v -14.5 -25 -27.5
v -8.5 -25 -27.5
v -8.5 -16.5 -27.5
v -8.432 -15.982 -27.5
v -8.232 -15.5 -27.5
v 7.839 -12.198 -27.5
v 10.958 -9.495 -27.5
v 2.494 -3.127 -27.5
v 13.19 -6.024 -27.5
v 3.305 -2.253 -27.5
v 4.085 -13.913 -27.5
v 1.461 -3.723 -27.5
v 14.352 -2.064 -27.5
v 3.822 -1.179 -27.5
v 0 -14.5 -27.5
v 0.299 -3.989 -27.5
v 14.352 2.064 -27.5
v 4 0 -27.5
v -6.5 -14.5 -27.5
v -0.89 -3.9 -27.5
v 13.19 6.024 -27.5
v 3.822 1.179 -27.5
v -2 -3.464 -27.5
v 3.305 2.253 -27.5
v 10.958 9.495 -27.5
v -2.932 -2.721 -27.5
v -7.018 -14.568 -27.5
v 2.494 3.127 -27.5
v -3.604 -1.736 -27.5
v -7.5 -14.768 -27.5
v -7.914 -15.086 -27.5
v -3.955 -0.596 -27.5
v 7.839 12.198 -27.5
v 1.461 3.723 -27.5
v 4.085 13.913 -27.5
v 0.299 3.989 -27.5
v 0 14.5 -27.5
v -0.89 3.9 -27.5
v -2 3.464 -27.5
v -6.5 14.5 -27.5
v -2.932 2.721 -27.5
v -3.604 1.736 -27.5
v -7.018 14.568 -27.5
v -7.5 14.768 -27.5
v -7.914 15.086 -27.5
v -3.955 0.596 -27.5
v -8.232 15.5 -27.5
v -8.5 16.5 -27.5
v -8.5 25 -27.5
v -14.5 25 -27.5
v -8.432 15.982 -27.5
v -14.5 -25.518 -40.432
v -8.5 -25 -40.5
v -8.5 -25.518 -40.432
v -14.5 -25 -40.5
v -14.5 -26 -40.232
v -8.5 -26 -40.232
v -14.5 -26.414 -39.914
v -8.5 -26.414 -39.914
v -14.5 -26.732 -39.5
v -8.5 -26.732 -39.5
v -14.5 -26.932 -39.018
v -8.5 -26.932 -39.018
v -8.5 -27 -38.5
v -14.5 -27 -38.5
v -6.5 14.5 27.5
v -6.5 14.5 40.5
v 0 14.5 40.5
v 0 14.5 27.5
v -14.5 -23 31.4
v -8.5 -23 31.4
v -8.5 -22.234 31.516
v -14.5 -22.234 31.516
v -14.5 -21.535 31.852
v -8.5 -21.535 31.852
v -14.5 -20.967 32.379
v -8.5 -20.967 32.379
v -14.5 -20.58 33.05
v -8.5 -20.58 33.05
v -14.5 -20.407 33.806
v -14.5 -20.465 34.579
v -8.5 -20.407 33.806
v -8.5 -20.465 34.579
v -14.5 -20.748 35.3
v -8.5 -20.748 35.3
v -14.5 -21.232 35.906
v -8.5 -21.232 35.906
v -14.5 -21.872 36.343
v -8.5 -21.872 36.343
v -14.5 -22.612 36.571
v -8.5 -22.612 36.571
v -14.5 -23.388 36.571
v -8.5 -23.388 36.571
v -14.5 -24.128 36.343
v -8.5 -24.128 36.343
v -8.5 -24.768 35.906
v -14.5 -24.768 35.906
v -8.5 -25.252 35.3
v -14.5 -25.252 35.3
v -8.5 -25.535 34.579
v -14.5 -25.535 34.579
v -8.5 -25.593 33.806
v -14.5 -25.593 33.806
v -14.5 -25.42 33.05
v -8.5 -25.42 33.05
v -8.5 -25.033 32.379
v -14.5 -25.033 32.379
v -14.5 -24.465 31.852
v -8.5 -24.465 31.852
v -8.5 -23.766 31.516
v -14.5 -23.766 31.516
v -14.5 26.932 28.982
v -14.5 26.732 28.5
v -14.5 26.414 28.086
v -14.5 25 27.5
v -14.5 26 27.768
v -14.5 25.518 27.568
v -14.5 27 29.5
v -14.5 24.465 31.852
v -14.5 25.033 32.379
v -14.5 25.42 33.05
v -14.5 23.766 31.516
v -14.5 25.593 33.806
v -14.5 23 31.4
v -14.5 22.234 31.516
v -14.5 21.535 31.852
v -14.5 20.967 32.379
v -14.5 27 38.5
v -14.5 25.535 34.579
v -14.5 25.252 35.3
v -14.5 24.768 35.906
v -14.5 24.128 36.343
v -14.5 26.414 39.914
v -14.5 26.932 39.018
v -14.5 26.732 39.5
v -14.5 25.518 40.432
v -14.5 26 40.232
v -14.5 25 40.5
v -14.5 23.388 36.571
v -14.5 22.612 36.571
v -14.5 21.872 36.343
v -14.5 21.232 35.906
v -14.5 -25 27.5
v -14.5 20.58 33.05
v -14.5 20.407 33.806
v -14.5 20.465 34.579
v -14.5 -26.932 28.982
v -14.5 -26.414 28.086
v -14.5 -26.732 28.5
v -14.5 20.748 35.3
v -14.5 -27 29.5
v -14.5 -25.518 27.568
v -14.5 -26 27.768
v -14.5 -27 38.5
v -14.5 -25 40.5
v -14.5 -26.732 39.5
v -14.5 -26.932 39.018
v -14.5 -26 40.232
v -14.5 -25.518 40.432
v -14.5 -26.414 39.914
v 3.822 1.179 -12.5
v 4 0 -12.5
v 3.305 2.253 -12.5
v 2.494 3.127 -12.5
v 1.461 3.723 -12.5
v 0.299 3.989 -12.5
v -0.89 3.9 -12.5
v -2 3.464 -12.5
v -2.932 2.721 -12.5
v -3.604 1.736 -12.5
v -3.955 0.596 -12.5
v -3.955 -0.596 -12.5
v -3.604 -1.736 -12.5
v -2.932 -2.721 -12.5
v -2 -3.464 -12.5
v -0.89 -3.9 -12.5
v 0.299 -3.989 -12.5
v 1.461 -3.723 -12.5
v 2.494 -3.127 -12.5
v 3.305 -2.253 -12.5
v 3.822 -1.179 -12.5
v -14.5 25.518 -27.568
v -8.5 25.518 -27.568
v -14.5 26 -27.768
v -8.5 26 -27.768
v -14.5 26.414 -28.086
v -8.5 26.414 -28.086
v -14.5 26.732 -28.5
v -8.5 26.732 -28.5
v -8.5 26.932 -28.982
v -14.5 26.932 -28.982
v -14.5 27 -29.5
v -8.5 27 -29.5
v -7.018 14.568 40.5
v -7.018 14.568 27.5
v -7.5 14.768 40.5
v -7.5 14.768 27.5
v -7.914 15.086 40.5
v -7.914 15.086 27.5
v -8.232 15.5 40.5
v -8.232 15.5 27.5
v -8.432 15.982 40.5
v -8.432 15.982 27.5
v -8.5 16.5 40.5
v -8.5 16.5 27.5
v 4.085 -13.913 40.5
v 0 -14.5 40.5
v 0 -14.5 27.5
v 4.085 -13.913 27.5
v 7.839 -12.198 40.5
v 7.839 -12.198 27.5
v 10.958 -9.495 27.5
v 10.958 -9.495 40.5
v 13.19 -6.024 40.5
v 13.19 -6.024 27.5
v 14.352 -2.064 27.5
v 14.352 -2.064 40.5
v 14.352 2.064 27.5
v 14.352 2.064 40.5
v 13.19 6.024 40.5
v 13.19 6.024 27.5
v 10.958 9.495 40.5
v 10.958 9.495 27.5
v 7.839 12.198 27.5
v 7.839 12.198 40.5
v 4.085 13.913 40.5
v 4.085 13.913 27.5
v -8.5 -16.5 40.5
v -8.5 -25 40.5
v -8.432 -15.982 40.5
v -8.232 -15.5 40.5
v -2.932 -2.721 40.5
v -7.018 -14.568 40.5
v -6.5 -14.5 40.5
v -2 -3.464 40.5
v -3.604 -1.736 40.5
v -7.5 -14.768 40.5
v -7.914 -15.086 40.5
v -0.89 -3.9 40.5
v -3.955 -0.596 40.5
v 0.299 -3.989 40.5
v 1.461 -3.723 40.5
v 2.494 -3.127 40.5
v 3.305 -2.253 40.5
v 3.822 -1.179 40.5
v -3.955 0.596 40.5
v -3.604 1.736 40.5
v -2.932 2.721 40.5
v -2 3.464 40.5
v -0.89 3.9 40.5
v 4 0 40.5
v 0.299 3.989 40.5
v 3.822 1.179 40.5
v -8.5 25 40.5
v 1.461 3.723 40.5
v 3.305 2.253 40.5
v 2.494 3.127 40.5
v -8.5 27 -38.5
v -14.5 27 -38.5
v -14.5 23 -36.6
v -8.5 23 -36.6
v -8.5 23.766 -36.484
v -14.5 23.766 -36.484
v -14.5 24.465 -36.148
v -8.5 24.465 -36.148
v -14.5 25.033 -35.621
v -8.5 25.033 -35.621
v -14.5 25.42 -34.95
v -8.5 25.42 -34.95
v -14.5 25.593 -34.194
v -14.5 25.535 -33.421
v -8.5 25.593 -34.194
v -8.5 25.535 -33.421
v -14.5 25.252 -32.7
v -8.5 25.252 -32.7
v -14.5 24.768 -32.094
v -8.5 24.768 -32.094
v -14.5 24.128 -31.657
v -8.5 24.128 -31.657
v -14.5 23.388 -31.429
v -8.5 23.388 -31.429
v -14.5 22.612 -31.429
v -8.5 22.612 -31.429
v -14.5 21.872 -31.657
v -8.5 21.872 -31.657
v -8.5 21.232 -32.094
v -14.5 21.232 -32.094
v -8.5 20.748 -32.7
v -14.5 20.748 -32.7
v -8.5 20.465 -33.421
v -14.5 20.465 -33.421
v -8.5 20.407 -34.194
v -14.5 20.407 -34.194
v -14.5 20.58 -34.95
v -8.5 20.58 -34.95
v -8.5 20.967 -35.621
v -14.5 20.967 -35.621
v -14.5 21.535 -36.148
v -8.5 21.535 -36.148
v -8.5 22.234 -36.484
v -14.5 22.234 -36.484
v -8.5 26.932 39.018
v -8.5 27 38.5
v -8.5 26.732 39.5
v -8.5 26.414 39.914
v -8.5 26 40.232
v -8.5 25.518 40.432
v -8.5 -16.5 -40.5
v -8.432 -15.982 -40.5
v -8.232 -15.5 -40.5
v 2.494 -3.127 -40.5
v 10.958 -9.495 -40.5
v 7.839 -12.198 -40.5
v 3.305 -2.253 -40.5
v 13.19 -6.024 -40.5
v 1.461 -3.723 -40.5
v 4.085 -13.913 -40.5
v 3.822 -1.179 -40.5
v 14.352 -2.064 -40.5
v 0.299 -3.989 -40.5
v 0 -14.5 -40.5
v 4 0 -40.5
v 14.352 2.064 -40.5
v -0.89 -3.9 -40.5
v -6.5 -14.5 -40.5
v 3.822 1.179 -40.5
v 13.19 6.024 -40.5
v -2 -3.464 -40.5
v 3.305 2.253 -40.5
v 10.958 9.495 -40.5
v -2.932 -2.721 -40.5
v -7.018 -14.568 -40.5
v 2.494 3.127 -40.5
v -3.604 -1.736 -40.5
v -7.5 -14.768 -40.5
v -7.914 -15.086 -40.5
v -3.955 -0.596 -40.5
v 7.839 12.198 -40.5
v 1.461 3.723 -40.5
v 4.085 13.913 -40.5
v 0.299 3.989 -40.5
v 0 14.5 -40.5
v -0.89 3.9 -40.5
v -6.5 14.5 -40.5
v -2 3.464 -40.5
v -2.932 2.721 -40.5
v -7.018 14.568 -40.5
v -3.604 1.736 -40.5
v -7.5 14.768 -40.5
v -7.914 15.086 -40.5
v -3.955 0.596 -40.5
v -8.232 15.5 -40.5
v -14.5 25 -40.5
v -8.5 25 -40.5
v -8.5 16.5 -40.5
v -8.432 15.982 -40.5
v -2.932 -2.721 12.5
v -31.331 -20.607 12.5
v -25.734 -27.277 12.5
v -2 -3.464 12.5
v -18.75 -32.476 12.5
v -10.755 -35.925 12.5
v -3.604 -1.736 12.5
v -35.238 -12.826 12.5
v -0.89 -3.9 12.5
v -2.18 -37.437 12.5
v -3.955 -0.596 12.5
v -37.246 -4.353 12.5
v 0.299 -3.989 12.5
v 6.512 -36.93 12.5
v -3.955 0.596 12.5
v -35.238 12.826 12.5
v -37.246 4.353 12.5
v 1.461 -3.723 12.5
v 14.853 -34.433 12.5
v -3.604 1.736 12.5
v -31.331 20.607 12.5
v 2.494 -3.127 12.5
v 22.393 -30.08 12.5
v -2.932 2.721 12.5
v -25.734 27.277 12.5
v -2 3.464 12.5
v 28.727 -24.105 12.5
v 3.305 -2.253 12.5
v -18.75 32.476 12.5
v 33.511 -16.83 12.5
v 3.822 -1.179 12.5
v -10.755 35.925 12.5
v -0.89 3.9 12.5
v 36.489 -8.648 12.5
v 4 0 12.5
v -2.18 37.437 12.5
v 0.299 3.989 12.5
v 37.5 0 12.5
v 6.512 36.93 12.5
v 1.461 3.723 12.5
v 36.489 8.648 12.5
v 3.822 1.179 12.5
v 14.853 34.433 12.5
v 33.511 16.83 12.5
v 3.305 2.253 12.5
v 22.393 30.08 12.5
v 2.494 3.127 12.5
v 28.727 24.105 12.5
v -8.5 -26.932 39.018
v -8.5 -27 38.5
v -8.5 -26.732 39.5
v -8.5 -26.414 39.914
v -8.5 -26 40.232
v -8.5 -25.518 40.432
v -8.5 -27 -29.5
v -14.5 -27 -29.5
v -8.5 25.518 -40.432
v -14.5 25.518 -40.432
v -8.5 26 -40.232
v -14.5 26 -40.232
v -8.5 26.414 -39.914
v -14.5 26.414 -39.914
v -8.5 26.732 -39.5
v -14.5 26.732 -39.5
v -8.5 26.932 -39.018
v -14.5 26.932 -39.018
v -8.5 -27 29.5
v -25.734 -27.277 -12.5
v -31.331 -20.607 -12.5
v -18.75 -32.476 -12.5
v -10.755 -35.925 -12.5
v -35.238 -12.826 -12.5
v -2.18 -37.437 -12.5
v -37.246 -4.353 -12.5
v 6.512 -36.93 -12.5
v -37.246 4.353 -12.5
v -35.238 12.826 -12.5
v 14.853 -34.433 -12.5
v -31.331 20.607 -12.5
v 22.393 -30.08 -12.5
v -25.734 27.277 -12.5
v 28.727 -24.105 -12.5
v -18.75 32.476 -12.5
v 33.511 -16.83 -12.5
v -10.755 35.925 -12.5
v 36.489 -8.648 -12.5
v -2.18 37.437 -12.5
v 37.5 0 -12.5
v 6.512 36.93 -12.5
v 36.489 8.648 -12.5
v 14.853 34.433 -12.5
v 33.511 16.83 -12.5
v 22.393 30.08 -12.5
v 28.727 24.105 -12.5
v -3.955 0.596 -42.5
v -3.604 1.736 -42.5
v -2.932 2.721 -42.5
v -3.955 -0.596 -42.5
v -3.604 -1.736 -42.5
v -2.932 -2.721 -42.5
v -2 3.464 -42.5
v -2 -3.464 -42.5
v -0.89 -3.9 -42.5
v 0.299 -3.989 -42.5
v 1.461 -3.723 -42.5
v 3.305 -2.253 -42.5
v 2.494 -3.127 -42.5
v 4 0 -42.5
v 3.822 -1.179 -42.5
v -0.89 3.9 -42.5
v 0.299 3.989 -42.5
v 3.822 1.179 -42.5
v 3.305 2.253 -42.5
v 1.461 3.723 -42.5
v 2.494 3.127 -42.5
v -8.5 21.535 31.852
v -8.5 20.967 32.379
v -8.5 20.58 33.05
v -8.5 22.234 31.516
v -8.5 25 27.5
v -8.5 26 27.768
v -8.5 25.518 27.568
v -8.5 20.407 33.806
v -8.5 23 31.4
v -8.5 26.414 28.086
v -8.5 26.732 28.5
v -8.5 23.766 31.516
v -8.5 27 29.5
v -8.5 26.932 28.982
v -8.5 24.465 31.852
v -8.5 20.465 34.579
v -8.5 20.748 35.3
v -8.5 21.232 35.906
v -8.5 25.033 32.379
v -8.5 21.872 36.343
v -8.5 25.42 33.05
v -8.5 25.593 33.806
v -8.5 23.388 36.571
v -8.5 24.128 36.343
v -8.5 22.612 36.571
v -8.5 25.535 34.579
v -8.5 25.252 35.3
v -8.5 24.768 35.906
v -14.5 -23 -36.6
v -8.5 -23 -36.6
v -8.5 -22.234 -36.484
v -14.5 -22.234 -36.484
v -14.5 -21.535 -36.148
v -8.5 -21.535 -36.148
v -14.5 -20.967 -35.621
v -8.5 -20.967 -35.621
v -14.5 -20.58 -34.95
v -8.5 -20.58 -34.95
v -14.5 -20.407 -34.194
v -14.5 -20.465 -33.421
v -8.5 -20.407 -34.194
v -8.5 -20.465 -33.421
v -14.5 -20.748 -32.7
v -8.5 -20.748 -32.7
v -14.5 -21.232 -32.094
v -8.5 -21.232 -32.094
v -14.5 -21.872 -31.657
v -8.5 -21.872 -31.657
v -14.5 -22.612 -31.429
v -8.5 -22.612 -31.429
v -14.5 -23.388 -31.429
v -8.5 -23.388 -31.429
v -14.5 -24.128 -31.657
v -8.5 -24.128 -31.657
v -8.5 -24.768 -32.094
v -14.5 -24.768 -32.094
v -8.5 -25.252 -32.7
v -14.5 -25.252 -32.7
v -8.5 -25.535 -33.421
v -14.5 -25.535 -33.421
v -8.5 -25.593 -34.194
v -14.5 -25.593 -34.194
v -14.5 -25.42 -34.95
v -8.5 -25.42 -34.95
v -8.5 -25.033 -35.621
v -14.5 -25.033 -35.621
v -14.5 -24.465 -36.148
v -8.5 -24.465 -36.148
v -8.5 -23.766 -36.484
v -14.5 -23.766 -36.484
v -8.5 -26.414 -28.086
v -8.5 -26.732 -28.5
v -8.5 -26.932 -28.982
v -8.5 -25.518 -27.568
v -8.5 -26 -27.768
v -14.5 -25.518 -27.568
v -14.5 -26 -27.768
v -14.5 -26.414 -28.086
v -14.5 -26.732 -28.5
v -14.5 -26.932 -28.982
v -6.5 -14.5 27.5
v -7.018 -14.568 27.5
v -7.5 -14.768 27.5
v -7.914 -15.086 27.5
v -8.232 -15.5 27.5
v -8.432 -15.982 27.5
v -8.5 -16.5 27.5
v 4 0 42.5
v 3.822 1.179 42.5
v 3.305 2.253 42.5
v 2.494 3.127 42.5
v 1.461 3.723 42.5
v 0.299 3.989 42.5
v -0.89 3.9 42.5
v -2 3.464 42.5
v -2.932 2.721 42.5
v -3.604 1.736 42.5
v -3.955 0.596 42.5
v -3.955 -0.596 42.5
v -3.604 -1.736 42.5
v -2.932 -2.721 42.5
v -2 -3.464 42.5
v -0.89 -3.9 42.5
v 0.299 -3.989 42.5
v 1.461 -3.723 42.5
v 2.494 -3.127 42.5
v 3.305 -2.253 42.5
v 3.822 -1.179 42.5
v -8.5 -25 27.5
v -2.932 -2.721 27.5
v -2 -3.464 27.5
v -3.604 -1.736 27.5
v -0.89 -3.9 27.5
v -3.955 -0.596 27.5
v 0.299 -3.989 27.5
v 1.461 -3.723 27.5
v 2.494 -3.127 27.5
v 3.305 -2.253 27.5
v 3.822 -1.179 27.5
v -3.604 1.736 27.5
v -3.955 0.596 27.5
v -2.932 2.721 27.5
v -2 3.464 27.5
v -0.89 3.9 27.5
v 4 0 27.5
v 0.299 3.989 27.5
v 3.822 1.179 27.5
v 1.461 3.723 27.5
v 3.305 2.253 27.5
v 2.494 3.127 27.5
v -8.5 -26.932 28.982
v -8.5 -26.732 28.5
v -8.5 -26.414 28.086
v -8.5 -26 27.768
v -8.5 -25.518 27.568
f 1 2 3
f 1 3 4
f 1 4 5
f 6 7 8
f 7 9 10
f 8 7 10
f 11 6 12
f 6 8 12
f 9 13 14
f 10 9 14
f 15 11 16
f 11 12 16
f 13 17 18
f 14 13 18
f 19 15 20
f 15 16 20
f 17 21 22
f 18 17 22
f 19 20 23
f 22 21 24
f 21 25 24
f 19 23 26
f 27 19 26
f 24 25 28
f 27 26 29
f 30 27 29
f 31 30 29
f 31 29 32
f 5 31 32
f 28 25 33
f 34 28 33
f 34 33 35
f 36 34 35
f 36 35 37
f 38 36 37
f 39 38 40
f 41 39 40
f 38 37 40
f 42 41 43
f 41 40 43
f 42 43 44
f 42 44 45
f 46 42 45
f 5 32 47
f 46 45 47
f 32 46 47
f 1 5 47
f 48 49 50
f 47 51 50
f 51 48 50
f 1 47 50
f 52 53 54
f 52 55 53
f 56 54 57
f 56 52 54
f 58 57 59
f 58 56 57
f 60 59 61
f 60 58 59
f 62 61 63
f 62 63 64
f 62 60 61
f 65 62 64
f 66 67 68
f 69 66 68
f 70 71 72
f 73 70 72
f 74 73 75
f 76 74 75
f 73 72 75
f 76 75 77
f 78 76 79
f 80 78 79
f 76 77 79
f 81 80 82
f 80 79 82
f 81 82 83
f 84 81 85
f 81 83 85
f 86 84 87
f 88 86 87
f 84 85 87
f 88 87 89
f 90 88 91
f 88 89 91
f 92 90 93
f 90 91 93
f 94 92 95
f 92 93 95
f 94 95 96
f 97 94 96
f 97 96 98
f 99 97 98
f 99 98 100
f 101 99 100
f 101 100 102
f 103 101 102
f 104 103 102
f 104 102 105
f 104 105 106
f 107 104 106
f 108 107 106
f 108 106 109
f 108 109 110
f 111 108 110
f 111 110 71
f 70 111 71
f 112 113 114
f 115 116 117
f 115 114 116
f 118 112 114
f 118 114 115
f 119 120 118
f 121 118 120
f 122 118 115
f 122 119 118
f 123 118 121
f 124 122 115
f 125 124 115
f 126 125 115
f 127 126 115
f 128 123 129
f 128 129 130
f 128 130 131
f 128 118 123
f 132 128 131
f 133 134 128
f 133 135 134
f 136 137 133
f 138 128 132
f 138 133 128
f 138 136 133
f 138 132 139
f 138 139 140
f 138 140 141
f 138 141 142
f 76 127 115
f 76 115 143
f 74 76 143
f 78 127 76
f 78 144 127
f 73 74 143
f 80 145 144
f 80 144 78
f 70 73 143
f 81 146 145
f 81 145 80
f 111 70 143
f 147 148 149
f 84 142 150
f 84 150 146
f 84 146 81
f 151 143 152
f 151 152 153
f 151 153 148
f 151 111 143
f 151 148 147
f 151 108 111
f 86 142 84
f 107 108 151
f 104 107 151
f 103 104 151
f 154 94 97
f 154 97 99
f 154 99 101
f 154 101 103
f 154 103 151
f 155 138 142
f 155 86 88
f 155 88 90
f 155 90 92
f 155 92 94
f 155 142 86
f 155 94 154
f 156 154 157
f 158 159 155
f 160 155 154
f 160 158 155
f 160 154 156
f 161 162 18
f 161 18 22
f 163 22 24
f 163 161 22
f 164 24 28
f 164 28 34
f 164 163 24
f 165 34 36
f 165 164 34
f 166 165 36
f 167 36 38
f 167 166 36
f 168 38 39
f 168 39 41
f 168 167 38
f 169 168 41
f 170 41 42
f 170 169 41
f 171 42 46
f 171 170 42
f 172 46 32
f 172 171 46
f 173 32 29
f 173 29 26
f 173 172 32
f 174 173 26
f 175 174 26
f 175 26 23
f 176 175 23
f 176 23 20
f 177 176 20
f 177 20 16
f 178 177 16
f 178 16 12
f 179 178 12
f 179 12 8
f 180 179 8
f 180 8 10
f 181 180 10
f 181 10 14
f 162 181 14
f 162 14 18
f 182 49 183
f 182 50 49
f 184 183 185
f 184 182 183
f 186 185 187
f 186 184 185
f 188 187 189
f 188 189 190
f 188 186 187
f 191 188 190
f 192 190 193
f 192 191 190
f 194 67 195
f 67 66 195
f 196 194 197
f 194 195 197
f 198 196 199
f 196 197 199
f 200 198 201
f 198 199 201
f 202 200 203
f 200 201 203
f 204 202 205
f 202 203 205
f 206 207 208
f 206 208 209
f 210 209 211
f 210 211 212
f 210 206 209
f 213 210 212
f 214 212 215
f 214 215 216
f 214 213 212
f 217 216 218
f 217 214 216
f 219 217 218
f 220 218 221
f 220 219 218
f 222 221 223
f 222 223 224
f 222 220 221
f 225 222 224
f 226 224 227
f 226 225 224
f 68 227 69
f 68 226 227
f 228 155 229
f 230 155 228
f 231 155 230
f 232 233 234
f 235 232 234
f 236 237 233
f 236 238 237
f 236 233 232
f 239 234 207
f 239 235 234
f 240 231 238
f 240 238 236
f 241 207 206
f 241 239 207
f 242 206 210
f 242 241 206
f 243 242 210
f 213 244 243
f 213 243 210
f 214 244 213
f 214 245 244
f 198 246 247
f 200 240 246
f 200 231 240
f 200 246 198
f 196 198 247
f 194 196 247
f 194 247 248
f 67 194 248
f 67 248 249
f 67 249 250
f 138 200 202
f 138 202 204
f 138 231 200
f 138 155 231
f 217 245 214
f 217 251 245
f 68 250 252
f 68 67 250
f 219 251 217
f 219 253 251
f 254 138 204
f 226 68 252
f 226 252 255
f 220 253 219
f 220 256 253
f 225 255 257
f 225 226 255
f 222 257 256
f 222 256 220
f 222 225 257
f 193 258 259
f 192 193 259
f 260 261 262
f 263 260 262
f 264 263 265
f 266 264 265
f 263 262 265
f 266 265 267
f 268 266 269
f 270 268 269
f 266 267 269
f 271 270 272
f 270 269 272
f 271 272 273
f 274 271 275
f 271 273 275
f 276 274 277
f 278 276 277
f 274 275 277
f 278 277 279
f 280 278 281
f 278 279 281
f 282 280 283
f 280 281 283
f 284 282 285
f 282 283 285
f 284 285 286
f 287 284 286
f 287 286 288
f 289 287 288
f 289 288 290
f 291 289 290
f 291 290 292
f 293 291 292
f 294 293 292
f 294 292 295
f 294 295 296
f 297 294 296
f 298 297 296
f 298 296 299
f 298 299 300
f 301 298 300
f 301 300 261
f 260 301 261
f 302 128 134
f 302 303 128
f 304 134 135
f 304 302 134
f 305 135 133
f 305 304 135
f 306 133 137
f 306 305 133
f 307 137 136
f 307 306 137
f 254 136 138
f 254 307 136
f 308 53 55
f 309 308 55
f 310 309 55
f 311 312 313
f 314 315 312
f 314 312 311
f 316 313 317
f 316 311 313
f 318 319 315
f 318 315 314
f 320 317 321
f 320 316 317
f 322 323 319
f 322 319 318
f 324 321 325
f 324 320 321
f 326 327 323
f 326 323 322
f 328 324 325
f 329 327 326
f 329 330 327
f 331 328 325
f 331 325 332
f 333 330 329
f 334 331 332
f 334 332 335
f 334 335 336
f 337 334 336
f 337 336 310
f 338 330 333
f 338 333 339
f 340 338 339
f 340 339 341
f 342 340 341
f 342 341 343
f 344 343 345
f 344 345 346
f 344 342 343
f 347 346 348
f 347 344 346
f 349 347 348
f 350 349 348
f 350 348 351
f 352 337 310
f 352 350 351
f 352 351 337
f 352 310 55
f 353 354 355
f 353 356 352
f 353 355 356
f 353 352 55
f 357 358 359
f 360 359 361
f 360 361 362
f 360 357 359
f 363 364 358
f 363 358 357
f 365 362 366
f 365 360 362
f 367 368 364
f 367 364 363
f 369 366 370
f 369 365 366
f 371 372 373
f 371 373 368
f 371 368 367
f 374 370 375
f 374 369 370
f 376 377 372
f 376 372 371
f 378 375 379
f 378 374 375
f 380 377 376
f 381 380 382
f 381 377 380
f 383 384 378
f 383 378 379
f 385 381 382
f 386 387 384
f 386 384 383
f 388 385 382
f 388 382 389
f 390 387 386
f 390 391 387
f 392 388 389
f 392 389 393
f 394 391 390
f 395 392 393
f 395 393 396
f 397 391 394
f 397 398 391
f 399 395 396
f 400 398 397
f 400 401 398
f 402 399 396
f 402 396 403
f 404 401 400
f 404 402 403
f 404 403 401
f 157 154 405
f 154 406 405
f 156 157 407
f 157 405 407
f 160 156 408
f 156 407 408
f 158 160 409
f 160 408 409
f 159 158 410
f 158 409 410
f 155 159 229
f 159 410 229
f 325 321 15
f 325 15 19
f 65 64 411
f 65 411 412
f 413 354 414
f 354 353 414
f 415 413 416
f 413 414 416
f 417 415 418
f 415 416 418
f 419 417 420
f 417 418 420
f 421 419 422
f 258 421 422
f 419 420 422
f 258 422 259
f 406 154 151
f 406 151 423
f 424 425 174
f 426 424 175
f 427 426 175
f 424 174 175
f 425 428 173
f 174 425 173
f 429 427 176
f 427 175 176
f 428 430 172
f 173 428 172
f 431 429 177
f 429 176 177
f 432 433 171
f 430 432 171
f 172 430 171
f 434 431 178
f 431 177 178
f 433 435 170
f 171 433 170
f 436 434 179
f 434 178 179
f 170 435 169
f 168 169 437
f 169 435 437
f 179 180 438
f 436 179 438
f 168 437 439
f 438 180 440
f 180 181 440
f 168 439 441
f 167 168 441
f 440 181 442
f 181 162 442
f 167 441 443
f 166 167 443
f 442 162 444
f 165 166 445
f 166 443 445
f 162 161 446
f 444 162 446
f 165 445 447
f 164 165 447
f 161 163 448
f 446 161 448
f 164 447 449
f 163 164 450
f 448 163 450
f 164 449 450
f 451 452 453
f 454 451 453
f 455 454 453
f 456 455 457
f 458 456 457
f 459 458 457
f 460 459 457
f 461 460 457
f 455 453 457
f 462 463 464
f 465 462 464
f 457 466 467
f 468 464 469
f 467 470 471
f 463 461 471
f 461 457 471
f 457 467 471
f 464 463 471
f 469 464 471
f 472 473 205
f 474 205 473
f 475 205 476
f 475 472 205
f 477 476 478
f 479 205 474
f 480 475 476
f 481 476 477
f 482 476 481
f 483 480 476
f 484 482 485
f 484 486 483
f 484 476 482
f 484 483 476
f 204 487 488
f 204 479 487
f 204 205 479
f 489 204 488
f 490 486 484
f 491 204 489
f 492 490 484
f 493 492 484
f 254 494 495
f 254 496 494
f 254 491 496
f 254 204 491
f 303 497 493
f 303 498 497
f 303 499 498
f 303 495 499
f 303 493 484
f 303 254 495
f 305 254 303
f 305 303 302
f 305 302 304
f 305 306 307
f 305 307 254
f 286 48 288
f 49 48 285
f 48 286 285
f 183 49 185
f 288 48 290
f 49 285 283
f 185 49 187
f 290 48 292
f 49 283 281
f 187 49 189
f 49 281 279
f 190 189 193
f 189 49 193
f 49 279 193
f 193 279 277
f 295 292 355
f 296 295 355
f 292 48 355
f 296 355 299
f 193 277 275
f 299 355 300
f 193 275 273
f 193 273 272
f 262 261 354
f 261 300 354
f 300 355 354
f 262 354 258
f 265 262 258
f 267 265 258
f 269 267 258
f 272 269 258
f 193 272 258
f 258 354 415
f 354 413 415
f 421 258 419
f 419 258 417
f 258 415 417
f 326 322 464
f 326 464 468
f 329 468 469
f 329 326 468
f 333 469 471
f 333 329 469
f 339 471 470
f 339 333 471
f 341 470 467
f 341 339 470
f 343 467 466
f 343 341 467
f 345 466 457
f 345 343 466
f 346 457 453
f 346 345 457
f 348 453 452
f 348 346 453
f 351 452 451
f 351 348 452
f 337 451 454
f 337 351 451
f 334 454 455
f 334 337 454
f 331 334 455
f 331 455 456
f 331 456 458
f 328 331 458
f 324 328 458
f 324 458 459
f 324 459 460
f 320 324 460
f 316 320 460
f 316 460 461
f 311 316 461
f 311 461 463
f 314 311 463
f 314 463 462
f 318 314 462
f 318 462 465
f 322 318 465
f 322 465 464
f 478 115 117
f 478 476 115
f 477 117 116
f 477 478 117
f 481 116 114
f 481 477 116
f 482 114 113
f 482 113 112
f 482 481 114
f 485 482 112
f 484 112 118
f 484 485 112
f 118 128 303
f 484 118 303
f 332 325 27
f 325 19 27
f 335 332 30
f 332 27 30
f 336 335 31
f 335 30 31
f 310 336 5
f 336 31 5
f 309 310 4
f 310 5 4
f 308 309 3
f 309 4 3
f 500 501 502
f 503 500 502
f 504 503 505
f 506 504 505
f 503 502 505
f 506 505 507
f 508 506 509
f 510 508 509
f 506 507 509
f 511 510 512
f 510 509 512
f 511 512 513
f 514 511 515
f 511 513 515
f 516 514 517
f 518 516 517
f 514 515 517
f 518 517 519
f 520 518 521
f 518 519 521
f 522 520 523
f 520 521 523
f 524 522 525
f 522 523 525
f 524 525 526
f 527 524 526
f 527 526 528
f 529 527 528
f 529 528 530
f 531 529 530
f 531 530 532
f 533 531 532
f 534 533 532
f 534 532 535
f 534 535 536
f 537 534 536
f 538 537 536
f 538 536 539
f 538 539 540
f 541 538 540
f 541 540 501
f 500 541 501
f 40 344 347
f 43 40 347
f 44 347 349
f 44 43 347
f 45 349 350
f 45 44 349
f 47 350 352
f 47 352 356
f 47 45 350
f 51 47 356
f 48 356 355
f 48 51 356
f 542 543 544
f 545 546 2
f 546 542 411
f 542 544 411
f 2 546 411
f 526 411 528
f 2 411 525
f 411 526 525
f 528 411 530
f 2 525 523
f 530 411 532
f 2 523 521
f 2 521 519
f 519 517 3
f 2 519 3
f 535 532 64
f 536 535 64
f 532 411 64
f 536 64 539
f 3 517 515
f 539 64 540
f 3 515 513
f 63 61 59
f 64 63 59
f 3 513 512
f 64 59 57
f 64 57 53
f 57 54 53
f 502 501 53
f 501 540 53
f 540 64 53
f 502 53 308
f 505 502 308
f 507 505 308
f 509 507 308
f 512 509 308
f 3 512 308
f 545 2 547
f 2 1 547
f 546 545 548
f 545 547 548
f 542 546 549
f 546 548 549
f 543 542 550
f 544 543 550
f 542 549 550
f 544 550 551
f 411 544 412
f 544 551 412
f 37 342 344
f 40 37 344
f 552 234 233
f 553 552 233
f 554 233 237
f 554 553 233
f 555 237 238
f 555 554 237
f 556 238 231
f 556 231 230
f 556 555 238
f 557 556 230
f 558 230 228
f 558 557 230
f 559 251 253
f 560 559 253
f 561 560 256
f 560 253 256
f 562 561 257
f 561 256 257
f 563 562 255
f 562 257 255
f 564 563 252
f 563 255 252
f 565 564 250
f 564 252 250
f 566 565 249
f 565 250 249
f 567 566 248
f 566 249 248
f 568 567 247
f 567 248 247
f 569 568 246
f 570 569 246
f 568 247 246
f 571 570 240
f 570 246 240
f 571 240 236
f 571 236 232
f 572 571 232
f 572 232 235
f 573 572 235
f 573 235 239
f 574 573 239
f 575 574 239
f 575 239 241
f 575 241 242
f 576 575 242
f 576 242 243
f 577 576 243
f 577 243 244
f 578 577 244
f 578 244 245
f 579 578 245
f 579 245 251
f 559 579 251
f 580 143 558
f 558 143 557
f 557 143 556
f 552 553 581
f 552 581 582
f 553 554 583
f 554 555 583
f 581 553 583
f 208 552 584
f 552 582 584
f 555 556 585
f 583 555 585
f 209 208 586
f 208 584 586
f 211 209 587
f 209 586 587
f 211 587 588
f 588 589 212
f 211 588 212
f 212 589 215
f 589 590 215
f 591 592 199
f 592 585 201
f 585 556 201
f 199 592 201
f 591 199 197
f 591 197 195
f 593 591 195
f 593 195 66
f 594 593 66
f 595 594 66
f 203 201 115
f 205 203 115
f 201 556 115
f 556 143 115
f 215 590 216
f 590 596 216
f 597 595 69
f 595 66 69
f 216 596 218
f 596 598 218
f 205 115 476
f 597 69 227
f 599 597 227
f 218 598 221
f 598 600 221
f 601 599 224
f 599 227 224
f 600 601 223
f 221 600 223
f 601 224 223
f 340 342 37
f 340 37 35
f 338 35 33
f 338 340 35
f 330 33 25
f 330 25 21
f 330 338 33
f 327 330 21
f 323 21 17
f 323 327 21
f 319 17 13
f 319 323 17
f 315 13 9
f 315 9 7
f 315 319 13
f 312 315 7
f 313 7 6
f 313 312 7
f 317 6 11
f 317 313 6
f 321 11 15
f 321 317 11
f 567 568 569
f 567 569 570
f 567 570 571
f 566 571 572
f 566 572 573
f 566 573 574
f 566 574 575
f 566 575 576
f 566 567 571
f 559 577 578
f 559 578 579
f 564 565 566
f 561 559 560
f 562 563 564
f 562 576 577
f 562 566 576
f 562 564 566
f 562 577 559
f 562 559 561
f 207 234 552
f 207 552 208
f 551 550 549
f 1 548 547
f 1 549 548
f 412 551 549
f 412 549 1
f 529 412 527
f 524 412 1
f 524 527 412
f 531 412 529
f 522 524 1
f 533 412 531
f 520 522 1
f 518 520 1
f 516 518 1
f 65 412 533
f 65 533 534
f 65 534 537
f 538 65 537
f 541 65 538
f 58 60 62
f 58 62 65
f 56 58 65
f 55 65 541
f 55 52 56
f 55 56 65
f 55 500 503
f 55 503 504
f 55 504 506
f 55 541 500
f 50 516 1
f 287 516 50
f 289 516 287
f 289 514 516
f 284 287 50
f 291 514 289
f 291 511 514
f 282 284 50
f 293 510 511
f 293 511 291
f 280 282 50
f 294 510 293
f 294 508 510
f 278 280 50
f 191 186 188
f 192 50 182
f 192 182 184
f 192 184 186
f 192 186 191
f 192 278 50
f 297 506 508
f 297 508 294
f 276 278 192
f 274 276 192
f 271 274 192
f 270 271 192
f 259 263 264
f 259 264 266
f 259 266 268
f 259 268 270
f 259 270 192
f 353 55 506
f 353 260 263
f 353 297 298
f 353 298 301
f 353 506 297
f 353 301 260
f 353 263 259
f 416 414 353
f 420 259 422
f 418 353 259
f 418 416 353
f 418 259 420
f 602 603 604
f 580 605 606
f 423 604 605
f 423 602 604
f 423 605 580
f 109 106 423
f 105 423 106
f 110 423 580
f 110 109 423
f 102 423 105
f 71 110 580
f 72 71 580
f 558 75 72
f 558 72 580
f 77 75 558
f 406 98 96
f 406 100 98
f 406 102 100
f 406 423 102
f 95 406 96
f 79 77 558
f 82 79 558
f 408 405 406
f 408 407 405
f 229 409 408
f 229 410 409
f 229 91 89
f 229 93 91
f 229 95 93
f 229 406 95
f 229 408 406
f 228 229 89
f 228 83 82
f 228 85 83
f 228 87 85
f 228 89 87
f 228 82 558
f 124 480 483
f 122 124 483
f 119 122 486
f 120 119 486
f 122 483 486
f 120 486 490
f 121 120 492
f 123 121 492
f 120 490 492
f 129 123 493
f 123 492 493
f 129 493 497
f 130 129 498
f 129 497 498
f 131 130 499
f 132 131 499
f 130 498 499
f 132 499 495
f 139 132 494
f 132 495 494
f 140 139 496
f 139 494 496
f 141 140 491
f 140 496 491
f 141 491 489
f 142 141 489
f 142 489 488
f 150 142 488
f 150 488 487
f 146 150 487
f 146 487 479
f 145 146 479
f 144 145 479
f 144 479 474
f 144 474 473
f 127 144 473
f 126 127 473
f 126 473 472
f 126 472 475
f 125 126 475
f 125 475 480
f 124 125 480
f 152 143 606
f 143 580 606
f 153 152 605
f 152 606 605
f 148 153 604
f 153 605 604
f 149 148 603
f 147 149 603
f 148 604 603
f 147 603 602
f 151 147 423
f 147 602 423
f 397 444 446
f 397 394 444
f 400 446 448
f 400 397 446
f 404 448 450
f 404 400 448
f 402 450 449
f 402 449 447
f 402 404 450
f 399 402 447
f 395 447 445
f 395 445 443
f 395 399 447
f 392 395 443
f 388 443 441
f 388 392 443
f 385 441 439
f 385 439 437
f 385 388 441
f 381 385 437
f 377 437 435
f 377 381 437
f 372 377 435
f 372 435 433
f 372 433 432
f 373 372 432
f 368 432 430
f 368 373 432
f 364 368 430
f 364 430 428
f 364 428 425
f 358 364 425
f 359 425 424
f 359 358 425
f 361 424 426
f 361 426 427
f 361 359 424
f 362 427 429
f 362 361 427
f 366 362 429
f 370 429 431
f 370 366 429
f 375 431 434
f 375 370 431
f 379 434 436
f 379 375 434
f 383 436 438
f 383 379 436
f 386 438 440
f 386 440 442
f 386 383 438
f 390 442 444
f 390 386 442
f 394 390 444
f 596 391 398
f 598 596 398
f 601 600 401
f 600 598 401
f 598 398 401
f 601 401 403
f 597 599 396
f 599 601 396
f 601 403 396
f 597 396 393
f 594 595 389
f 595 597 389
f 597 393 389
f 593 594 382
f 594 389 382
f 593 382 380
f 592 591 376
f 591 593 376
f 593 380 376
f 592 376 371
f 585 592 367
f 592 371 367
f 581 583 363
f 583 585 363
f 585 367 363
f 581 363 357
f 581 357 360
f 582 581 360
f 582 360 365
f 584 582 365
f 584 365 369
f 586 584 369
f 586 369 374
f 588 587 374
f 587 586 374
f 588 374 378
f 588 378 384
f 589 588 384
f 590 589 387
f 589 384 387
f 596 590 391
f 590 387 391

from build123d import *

# Parameters (mm, degrees)
EXTRUDE_1_DEPTH      = 12.5
EXTRUDE_1_DEPTH_BACK = 12.5
SKETCH_1_R           = 37.5
EXTRUDE_2_DEPTH      = 42.5
EXTRUDE_2_DEPTH_BACK = 42.5
SKETCH_1_3_R         = 4
EXTRUDE_3_DEPTH      = 13
EXTRUDE_START        = -13
EXTRUDE_4_DEPTH      = 13
SKETCH_4_R           = 2.6
CUT_EXTRUDE_1_DEPTH  = 73.996575262
FILLET_1_R           = 2


with BuildPart() as part:
    # 草图1 → 凸台-拉伸1 (new, two sides: drawn at the far end of the back side and taken through both)
    with BuildSketch(Plane.XY.offset(-EXTRUDE_1_DEPTH_BACK)):
        Circle(SKETCH_1_R)
    extrude(amount=EXTRUDE_1_DEPTH + EXTRUDE_1_DEPTH_BACK)

    # 草图1<3> → 凸台-拉伸2 (add, two sides: drawn at the far end of the back side and taken through both)
    with BuildSketch(Plane.XY.offset(-EXTRUDE_2_DEPTH_BACK)):
        Circle(SKETCH_1_3_R)
    extrude(amount=EXTRUDE_2_DEPTH + EXTRUDE_2_DEPTH_BACK)

    # 草图2 → 凸台-拉伸3 (add)
    with BuildSketch(Plane.XY.offset(40.5)):
        with BuildLine():
            Line((0, 14.5), (-8.5, 14.5))
            Line((-8.5, 14.5), (-8.5, 27))
            Line((-8.5, 27), (-14.5, 27))
            Line((-14.5, 27), (-14.5, -27))
            Line((-14.5, -27), (-8.5, -27))
            Line((-8.5, -27), (-8.5, -14.5))
            Line((-8.5, -14.5), (0, -14.5))
            ThreePointArc((0, -14.5), (14.5, 0), (0, 14.5))
        make_face()
    extrude(amount=-EXTRUDE_3_DEPTH)

    # 草图3 → 凸台-拉伸4 (add)
    with BuildSketch(Plane(origin=(0, 0, -40.5), x_dir=(-1, 0, 0), z_dir=(0, 0, -1)).offset(EXTRUDE_START)):
        with BuildLine():
            ThreePointArc((0, 14.5), (-14.5, 0), (0, -14.5))
            Line((0, -14.5), (8.5, -14.5))
            Line((8.5, -14.5), (8.5, -27))
            Line((8.5, -27), (14.5, -27))
            Line((14.5, -27), (14.5, 27))
            Line((14.5, 27), (8.5, 27))
            Line((8.5, 27), (8.5, 14.5))
            Line((8.5, 14.5), (0, 14.5))
        make_face()
    extrude(amount=EXTRUDE_4_DEPTH)

    # 草图4 → 切除-拉伸1 (cut, through all)
    with BuildSketch(Plane(origin=(-8.5, 0, 0), x_dir=(0, 0, -1), z_dir=(1, 0, 0))):
        with Locations((34, 23)):
            Circle(SKETCH_4_R)
        with Locations((34, -23)):
            Circle(SKETCH_4_R)
        with Locations((-34, -23)):
            Circle(SKETCH_4_R)
        with Locations((-34, 23)):
            Circle(SKETCH_4_R)
    extrude(amount=-CUT_EXTRUDE_1_DEPTH, mode=Mode.SUBTRACT)

    # 圆角1
    fillet_1_edges = [part.edges().sort_by_distance(p)[0] for p in [
        (-11.5, 27, 27.5),
        (-11.5, 27, 40.5),
        (-8.5, 14.5, 34),
        (-8.5, -14.5, 34),
        (-11.5, -27, 40.5),
        (-11.5, -27, 27.5),
        (-11.5, -27, -27.5),
        (-11.5, 27, -27.5),
        (-11.5, 27, -40.5),
        (-11.5, -27, -40.5),
        (-8.5, -14.5, -34),
        (-8.5, 14.5, -34),
    ]]
    fillet(fillet_1_edges, radius=FILLET_1_R)


solid = part.part
